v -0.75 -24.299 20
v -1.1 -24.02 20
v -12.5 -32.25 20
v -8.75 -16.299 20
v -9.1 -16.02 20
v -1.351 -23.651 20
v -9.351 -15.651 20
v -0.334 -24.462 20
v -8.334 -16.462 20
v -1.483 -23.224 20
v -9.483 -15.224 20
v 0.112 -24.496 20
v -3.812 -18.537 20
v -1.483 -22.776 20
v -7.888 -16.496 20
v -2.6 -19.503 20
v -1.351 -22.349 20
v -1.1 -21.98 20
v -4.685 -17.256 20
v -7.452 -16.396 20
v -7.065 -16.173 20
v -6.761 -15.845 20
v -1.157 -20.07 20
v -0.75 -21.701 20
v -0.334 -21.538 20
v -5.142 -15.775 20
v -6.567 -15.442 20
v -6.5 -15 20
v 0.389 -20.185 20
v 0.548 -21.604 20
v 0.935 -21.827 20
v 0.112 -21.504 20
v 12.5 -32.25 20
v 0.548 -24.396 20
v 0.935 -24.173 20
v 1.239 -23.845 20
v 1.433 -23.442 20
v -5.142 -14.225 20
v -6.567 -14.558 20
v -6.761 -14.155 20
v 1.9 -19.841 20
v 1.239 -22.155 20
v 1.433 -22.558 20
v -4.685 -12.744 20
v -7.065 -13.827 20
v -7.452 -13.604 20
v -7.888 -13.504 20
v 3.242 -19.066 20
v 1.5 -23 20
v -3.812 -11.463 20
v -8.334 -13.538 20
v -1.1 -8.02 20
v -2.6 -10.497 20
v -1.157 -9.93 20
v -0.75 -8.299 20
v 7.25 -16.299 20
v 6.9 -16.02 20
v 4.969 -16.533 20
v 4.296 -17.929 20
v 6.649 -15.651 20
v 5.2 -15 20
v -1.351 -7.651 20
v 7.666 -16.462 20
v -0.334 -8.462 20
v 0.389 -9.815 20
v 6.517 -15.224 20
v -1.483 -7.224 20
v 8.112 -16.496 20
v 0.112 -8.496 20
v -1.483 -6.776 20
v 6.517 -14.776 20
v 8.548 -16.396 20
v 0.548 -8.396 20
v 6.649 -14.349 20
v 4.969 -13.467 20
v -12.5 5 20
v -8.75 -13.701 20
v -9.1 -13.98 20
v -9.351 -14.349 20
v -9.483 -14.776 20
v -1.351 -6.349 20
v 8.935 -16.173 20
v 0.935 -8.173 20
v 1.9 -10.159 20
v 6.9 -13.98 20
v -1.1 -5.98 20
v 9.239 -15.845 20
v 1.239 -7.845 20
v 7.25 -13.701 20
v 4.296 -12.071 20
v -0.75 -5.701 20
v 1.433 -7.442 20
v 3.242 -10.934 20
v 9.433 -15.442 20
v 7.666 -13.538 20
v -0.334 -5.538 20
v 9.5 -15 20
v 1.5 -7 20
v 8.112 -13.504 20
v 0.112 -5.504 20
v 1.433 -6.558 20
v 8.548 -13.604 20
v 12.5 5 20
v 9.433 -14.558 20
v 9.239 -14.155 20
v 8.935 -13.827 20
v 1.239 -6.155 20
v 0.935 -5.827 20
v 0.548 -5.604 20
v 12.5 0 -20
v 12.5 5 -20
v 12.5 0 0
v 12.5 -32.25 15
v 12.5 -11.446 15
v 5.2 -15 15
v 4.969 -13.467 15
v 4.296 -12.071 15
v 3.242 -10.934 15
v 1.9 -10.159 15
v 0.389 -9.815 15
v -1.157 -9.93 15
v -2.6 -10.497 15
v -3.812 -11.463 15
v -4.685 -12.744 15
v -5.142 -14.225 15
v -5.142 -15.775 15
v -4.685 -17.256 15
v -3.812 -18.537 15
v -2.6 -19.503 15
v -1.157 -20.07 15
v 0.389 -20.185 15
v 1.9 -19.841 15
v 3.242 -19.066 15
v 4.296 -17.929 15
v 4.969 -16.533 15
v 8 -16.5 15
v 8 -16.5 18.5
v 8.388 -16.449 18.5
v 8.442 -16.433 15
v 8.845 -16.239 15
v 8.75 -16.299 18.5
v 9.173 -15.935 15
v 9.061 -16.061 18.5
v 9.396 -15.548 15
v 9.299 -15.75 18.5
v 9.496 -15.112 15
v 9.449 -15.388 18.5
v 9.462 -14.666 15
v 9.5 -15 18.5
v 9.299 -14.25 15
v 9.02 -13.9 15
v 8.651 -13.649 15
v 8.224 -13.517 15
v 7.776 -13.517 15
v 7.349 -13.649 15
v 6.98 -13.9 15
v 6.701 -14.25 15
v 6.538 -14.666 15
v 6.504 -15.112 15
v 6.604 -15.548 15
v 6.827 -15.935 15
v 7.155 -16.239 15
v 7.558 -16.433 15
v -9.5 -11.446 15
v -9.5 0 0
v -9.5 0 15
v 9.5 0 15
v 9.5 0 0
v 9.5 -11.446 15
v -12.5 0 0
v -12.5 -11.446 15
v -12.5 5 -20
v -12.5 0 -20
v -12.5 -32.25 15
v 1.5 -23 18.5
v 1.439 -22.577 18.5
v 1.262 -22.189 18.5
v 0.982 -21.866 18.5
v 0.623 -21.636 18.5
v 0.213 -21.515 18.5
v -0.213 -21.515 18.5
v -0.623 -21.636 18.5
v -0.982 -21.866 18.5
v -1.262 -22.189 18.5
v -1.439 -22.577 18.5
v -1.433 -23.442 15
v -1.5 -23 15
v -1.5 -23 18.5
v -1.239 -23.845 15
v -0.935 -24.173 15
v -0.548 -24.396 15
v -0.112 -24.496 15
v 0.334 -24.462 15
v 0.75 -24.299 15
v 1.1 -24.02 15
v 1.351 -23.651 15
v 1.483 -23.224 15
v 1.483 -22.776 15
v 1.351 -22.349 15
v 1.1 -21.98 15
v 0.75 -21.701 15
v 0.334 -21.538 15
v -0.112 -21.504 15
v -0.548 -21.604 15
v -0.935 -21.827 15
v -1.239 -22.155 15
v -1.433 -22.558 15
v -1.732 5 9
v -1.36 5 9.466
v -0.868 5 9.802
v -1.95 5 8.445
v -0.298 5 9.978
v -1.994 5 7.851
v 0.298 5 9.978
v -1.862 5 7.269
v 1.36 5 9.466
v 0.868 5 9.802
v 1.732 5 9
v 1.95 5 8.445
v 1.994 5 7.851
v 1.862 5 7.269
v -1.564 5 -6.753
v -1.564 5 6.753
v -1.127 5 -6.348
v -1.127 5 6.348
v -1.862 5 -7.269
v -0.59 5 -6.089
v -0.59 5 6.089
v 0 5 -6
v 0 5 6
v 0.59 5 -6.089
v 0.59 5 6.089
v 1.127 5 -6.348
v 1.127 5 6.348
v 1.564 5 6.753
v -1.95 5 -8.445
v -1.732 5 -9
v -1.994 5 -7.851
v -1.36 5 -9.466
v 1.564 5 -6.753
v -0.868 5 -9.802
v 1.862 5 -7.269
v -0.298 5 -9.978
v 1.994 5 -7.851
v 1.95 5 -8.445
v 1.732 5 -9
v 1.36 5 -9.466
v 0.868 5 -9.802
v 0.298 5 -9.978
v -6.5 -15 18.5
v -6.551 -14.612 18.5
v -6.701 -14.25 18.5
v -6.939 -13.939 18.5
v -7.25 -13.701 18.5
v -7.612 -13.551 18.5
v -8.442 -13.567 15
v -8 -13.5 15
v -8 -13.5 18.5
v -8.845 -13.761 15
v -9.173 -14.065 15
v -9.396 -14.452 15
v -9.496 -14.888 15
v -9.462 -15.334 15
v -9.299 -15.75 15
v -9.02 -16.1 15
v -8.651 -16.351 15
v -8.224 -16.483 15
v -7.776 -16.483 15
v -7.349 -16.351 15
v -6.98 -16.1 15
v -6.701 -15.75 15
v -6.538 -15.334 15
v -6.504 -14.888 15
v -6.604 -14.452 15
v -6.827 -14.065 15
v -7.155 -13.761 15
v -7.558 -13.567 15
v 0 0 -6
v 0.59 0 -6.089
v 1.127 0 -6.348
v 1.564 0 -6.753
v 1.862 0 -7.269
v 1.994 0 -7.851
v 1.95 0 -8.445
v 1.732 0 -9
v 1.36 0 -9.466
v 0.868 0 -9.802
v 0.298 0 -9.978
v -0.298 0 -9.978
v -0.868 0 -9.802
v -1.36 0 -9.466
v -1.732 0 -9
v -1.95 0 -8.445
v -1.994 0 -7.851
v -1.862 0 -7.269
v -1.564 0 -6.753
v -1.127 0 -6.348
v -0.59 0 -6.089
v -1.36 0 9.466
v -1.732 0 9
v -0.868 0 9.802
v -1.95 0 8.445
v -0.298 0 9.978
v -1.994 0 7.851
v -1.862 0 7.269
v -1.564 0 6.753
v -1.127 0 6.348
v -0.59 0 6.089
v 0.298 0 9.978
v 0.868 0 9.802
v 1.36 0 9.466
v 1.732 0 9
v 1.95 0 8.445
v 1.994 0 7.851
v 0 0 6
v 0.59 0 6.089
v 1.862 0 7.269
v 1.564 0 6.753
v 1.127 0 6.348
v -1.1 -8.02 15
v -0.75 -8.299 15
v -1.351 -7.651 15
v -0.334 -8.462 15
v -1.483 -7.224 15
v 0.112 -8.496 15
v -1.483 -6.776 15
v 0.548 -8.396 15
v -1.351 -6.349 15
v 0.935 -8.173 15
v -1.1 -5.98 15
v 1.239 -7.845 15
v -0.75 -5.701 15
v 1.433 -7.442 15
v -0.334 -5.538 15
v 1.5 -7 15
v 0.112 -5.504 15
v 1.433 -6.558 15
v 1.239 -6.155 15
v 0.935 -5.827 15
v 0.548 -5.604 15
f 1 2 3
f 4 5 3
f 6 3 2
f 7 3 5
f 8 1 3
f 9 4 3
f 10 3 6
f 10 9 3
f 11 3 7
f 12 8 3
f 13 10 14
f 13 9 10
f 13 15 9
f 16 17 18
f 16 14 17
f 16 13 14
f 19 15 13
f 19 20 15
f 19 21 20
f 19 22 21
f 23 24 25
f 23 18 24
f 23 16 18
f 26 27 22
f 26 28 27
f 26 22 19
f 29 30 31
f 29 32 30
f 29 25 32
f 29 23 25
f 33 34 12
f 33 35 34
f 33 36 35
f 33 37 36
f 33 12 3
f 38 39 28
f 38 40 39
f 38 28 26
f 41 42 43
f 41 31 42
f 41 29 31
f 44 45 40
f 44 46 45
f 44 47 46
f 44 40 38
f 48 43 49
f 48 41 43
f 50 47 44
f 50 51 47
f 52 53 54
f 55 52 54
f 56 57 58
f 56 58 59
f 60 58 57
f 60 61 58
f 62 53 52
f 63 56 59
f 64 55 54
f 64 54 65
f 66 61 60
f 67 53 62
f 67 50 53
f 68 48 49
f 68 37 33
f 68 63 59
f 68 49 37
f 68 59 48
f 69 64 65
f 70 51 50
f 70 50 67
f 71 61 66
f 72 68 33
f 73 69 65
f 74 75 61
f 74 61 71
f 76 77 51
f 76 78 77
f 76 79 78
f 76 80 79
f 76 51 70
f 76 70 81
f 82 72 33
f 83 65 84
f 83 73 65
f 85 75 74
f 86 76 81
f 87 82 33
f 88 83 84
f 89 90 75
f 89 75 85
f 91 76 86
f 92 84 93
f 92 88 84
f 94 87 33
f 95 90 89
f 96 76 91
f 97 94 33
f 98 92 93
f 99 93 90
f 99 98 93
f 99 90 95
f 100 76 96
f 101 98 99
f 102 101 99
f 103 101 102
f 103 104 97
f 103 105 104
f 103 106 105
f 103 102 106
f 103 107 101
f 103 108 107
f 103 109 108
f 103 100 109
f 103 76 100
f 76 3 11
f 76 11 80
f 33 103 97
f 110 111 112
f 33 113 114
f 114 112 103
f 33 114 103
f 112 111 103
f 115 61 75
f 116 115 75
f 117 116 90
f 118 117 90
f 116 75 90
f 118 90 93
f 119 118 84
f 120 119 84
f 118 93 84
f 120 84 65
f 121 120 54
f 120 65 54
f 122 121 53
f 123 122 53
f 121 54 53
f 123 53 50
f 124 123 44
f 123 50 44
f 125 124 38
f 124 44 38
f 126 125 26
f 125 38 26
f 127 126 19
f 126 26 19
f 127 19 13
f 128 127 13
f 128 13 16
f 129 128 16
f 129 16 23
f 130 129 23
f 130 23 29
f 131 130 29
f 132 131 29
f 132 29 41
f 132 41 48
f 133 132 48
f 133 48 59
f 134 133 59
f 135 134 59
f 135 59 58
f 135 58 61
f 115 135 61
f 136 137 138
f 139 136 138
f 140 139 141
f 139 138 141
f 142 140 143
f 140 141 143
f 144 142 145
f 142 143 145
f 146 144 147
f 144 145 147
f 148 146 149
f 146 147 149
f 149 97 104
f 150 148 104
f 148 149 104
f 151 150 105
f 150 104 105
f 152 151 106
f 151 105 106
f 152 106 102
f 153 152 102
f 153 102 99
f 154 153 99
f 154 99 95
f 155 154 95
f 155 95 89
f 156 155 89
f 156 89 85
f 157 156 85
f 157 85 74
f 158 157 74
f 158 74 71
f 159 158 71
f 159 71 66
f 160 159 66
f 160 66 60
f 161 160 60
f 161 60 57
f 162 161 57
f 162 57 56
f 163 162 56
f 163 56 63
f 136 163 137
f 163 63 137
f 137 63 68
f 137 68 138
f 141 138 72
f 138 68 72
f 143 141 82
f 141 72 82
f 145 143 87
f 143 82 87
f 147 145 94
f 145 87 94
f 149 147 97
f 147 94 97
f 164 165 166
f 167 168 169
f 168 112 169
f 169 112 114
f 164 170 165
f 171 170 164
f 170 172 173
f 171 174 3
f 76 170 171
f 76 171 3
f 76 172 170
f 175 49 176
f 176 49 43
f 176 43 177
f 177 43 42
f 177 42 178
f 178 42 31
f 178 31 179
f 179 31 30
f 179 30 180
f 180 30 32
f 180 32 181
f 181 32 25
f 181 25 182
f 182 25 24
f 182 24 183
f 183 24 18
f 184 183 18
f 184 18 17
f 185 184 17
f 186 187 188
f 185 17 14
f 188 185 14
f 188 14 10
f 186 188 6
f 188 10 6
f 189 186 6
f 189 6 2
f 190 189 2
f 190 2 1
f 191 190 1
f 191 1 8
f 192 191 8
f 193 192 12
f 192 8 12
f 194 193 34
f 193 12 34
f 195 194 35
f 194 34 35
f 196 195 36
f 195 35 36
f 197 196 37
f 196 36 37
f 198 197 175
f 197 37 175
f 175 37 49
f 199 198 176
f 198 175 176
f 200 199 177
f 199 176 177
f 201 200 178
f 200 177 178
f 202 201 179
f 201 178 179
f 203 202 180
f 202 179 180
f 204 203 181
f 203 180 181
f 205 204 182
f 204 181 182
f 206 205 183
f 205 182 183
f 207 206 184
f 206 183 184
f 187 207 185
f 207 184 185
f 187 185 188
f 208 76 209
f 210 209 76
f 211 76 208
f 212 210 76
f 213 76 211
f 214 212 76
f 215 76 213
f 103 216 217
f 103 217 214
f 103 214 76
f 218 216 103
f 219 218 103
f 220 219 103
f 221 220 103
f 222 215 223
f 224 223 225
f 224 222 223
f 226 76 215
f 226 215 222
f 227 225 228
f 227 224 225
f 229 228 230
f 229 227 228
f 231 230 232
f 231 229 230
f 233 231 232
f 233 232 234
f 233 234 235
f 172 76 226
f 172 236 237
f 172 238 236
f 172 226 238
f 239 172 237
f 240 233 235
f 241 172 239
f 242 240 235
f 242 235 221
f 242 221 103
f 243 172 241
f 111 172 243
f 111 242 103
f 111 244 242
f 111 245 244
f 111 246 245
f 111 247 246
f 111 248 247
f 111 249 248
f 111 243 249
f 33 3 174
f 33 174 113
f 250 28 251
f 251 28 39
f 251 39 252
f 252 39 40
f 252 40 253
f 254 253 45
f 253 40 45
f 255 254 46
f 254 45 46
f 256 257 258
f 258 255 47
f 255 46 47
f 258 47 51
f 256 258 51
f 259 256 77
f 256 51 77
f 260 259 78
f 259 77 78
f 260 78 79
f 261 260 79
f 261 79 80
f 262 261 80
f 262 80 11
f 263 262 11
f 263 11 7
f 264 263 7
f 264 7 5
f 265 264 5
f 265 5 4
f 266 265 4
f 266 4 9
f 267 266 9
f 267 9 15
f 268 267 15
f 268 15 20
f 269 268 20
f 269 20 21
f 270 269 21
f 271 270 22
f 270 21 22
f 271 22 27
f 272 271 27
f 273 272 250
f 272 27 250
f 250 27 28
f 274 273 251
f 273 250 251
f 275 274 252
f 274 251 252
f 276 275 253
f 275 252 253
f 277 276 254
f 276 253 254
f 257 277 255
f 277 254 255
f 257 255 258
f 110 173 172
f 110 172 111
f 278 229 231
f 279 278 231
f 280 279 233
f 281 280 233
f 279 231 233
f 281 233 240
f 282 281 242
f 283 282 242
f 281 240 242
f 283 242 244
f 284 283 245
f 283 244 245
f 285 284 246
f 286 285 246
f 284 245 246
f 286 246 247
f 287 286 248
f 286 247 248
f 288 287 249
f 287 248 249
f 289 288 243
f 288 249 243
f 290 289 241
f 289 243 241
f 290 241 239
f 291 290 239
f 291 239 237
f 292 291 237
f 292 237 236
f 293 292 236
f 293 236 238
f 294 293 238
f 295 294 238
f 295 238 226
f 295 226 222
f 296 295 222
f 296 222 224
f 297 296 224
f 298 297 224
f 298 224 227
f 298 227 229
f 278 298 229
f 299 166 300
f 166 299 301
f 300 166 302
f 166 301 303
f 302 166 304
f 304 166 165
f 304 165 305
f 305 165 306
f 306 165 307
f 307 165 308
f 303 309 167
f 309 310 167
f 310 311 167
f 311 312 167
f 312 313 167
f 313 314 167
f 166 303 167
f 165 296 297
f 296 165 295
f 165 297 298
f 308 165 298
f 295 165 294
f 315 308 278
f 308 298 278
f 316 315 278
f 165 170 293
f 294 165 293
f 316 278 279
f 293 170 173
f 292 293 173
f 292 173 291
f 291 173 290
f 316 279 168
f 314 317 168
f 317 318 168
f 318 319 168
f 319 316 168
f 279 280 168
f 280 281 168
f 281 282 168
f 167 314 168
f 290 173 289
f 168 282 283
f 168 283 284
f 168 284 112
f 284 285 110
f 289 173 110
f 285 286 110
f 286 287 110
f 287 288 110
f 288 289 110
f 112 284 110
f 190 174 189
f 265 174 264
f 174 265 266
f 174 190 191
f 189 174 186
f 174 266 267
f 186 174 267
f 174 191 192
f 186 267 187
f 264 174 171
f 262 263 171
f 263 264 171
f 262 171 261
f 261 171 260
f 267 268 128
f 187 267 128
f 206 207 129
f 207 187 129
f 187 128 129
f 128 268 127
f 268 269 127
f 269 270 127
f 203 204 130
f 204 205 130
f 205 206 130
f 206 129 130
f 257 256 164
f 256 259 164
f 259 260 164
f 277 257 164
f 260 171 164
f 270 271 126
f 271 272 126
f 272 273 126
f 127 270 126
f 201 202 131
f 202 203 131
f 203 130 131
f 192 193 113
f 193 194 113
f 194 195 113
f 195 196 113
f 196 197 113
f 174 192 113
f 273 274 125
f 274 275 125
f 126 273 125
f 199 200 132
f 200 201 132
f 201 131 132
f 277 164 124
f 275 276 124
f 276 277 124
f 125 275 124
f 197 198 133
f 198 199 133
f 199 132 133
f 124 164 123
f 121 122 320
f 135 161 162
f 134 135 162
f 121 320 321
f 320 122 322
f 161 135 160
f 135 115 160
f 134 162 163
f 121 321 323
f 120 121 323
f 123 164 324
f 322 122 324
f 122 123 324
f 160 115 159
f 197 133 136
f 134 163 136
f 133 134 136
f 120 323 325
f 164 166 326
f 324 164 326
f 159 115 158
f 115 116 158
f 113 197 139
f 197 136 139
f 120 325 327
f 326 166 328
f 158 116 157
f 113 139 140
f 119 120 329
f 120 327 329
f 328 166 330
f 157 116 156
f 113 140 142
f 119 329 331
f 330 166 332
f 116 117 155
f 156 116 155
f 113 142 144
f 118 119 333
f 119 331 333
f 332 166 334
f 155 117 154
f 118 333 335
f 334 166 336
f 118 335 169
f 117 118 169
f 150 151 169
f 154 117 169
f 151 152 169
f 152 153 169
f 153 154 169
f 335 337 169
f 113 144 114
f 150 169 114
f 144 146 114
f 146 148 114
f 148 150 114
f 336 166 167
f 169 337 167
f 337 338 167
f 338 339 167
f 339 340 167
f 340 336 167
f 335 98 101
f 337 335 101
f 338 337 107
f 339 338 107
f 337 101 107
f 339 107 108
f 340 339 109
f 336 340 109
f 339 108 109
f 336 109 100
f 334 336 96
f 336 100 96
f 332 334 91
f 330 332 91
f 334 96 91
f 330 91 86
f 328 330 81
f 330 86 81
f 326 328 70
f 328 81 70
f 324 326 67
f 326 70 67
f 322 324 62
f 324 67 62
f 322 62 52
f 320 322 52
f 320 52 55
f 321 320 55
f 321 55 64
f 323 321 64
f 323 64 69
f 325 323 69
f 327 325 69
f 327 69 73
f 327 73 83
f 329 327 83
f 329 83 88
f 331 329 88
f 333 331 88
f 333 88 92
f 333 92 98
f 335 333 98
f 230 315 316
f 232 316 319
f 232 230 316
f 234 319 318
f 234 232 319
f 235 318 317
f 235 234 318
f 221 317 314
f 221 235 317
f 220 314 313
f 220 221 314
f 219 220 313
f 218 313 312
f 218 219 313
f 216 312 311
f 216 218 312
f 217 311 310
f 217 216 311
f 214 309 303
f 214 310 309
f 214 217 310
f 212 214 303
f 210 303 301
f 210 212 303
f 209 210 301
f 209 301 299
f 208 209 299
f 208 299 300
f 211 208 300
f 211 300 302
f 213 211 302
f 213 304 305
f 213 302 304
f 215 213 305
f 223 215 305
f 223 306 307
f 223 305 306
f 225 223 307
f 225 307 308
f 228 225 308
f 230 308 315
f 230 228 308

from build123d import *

# Parameters (mm, degrees)
SKETCH1_W           = 25
SKETCH1_H           = 40
BOSS_EXTRUDE1_DEPTH = 5
SKETCH2_R           = 2
CUT_EXTRUDE1_DEPTH  = 11.5
SKETCH3_W           = 25
SKETCH3_H           = 5
BOSS_EXTRUDE2_DEPTH = 32.25
SKETCH5_R           = 11.1
CUT_EXTRUDE2_DEPTH  = 1.5
SKETCH6_R           = 5.2
CUT_EXTRUDE3_DEPTH  = 10.5
SKETCH7_R           = 1.5
CUT_EXTRUDE4_DEPTH  = 10.5
CIRPATTERN1_COUNT   = 4
BOSS_EXTRUDE3_DEPTH = 3
BOSS_EXTRUDE4_START = 1.5
SKETCH9_R           = 11.1
SKETCH9_R_2         = 5.2
SKETCH9_R_3         = 1.5
BOSS_EXTRUDE4_DEPTH = 1.5


with BuildPart() as part:
    # Sketch1 → Boss-Extrude1 (new body)
    with BuildSketch(Plane(origin=(0, 0, 0), x_dir=(1, 0, 0), z_dir=(0, 1, 0))):
        Rectangle(SKETCH1_W, SKETCH1_H)
    extrude(amount=BOSS_EXTRUDE1_DEPTH)

    # Sketch2 → Cut-Extrude1 (cut)
    with BuildSketch(Plane(origin=(0, 5, 0), x_dir=(1, 0, 0), z_dir=(0, 1, 0))):
        with Locations(Location((0, 8, 0), (0, 0, 270))):
            Circle(SKETCH2_R)
    cut_extrude1 = extrude(amount=-CUT_EXTRUDE1_DEPTH, mode=Mode.SUBTRACT)

    # Mirror1: Cut-Extrude1 across plane
    add(cut_extrude1.mirror(Plane.XY), mode=Mode.SUBTRACT)

    # Sketch3 → Boss-Extrude2 (add)
    with BuildSketch(Plane.XZ):
        with Locations((0, 17.5)):
            Rectangle(SKETCH3_W, SKETCH3_H)
    extrude(amount=BOSS_EXTRUDE2_DEPTH)

    # Sketch5 → Cut-Extrude2 (cut)
    with BuildSketch(Plane.XY.offset(20)):
        with Locations((0, -15)):
            Circle(SKETCH5_R)
    extrude(amount=-CUT_EXTRUDE2_DEPTH, mode=Mode.SUBTRACT)

    # Sketch6 → Cut-Extrude3 (cut)
    with BuildSketch(Plane.XY.offset(18.5)):
        with Locations((0, -15)):
            Circle(SKETCH6_R)
    extrude(amount=-CUT_EXTRUDE3_DEPTH, mode=Mode.SUBTRACT)

    # Sketch7 → Cut-Extrude4 (cut)
    with BuildSketch(Plane.XY.offset(18.5)):
        with Locations((0, -7)):
            Circle(SKETCH7_R)
    cut_extrude4 = extrude(amount=-CUT_EXTRUDE4_DEPTH, mode=Mode.SUBTRACT)

    # CirPattern1: Cut-Extrude4 ×4 about axis
    cirpattern1_axis = Axis((0, -15, 0), (0, 0, 1))
    for i in range(1, CIRPATTERN1_COUNT):
        add(cut_extrude4.rotate(cirpattern1_axis, i * 360 / CIRPATTERN1_COUNT), mode=Mode.SUBTRACT)

    # Sketch8 → Boss-Extrude3 (add)
    with BuildSketch(Plane.ZY.offset(12.5)):
        Polygon((15, 0), (0, 0), (15, -11.4463543), align=None)
    boss_extrude3 = extrude(amount=-BOSS_EXTRUDE3_DEPTH)

    # Mirror2: Boss-Extrude3 across plane
    add(boss_extrude3.mirror(Plane(origin=(0, 0, 0), x_dir=(0, 0, 1), z_dir=(1, 0, 0))))

    # Sketch9 → Boss-Extrude4 (add)
    with BuildSketch(Plane.XY.offset(18.5).offset(BOSS_EXTRUDE4_START)):
        with Locations((0, -15)):
            Circle(SKETCH9_R)
        with Locations((0, -15)):
            Circle(SKETCH9_R_2, mode=Mode.SUBTRACT)
        with Locations((0, -7)):
            Circle(SKETCH9_R_3, mode=Mode.SUBTRACT)
        with Locations((-8, -15)):
            Circle(SKETCH9_R_3, mode=Mode.SUBTRACT)
        with Locations((8, -15)):
            Circle(SKETCH9_R_3, mode=Mode.SUBTRACT)
        with Locations((0, -23)):
            Circle(SKETCH9_R_3, mode=Mode.SUBTRACT)
    extrude(amount=-BOSS_EXTRUDE4_DEPTH)


solid = part.part
